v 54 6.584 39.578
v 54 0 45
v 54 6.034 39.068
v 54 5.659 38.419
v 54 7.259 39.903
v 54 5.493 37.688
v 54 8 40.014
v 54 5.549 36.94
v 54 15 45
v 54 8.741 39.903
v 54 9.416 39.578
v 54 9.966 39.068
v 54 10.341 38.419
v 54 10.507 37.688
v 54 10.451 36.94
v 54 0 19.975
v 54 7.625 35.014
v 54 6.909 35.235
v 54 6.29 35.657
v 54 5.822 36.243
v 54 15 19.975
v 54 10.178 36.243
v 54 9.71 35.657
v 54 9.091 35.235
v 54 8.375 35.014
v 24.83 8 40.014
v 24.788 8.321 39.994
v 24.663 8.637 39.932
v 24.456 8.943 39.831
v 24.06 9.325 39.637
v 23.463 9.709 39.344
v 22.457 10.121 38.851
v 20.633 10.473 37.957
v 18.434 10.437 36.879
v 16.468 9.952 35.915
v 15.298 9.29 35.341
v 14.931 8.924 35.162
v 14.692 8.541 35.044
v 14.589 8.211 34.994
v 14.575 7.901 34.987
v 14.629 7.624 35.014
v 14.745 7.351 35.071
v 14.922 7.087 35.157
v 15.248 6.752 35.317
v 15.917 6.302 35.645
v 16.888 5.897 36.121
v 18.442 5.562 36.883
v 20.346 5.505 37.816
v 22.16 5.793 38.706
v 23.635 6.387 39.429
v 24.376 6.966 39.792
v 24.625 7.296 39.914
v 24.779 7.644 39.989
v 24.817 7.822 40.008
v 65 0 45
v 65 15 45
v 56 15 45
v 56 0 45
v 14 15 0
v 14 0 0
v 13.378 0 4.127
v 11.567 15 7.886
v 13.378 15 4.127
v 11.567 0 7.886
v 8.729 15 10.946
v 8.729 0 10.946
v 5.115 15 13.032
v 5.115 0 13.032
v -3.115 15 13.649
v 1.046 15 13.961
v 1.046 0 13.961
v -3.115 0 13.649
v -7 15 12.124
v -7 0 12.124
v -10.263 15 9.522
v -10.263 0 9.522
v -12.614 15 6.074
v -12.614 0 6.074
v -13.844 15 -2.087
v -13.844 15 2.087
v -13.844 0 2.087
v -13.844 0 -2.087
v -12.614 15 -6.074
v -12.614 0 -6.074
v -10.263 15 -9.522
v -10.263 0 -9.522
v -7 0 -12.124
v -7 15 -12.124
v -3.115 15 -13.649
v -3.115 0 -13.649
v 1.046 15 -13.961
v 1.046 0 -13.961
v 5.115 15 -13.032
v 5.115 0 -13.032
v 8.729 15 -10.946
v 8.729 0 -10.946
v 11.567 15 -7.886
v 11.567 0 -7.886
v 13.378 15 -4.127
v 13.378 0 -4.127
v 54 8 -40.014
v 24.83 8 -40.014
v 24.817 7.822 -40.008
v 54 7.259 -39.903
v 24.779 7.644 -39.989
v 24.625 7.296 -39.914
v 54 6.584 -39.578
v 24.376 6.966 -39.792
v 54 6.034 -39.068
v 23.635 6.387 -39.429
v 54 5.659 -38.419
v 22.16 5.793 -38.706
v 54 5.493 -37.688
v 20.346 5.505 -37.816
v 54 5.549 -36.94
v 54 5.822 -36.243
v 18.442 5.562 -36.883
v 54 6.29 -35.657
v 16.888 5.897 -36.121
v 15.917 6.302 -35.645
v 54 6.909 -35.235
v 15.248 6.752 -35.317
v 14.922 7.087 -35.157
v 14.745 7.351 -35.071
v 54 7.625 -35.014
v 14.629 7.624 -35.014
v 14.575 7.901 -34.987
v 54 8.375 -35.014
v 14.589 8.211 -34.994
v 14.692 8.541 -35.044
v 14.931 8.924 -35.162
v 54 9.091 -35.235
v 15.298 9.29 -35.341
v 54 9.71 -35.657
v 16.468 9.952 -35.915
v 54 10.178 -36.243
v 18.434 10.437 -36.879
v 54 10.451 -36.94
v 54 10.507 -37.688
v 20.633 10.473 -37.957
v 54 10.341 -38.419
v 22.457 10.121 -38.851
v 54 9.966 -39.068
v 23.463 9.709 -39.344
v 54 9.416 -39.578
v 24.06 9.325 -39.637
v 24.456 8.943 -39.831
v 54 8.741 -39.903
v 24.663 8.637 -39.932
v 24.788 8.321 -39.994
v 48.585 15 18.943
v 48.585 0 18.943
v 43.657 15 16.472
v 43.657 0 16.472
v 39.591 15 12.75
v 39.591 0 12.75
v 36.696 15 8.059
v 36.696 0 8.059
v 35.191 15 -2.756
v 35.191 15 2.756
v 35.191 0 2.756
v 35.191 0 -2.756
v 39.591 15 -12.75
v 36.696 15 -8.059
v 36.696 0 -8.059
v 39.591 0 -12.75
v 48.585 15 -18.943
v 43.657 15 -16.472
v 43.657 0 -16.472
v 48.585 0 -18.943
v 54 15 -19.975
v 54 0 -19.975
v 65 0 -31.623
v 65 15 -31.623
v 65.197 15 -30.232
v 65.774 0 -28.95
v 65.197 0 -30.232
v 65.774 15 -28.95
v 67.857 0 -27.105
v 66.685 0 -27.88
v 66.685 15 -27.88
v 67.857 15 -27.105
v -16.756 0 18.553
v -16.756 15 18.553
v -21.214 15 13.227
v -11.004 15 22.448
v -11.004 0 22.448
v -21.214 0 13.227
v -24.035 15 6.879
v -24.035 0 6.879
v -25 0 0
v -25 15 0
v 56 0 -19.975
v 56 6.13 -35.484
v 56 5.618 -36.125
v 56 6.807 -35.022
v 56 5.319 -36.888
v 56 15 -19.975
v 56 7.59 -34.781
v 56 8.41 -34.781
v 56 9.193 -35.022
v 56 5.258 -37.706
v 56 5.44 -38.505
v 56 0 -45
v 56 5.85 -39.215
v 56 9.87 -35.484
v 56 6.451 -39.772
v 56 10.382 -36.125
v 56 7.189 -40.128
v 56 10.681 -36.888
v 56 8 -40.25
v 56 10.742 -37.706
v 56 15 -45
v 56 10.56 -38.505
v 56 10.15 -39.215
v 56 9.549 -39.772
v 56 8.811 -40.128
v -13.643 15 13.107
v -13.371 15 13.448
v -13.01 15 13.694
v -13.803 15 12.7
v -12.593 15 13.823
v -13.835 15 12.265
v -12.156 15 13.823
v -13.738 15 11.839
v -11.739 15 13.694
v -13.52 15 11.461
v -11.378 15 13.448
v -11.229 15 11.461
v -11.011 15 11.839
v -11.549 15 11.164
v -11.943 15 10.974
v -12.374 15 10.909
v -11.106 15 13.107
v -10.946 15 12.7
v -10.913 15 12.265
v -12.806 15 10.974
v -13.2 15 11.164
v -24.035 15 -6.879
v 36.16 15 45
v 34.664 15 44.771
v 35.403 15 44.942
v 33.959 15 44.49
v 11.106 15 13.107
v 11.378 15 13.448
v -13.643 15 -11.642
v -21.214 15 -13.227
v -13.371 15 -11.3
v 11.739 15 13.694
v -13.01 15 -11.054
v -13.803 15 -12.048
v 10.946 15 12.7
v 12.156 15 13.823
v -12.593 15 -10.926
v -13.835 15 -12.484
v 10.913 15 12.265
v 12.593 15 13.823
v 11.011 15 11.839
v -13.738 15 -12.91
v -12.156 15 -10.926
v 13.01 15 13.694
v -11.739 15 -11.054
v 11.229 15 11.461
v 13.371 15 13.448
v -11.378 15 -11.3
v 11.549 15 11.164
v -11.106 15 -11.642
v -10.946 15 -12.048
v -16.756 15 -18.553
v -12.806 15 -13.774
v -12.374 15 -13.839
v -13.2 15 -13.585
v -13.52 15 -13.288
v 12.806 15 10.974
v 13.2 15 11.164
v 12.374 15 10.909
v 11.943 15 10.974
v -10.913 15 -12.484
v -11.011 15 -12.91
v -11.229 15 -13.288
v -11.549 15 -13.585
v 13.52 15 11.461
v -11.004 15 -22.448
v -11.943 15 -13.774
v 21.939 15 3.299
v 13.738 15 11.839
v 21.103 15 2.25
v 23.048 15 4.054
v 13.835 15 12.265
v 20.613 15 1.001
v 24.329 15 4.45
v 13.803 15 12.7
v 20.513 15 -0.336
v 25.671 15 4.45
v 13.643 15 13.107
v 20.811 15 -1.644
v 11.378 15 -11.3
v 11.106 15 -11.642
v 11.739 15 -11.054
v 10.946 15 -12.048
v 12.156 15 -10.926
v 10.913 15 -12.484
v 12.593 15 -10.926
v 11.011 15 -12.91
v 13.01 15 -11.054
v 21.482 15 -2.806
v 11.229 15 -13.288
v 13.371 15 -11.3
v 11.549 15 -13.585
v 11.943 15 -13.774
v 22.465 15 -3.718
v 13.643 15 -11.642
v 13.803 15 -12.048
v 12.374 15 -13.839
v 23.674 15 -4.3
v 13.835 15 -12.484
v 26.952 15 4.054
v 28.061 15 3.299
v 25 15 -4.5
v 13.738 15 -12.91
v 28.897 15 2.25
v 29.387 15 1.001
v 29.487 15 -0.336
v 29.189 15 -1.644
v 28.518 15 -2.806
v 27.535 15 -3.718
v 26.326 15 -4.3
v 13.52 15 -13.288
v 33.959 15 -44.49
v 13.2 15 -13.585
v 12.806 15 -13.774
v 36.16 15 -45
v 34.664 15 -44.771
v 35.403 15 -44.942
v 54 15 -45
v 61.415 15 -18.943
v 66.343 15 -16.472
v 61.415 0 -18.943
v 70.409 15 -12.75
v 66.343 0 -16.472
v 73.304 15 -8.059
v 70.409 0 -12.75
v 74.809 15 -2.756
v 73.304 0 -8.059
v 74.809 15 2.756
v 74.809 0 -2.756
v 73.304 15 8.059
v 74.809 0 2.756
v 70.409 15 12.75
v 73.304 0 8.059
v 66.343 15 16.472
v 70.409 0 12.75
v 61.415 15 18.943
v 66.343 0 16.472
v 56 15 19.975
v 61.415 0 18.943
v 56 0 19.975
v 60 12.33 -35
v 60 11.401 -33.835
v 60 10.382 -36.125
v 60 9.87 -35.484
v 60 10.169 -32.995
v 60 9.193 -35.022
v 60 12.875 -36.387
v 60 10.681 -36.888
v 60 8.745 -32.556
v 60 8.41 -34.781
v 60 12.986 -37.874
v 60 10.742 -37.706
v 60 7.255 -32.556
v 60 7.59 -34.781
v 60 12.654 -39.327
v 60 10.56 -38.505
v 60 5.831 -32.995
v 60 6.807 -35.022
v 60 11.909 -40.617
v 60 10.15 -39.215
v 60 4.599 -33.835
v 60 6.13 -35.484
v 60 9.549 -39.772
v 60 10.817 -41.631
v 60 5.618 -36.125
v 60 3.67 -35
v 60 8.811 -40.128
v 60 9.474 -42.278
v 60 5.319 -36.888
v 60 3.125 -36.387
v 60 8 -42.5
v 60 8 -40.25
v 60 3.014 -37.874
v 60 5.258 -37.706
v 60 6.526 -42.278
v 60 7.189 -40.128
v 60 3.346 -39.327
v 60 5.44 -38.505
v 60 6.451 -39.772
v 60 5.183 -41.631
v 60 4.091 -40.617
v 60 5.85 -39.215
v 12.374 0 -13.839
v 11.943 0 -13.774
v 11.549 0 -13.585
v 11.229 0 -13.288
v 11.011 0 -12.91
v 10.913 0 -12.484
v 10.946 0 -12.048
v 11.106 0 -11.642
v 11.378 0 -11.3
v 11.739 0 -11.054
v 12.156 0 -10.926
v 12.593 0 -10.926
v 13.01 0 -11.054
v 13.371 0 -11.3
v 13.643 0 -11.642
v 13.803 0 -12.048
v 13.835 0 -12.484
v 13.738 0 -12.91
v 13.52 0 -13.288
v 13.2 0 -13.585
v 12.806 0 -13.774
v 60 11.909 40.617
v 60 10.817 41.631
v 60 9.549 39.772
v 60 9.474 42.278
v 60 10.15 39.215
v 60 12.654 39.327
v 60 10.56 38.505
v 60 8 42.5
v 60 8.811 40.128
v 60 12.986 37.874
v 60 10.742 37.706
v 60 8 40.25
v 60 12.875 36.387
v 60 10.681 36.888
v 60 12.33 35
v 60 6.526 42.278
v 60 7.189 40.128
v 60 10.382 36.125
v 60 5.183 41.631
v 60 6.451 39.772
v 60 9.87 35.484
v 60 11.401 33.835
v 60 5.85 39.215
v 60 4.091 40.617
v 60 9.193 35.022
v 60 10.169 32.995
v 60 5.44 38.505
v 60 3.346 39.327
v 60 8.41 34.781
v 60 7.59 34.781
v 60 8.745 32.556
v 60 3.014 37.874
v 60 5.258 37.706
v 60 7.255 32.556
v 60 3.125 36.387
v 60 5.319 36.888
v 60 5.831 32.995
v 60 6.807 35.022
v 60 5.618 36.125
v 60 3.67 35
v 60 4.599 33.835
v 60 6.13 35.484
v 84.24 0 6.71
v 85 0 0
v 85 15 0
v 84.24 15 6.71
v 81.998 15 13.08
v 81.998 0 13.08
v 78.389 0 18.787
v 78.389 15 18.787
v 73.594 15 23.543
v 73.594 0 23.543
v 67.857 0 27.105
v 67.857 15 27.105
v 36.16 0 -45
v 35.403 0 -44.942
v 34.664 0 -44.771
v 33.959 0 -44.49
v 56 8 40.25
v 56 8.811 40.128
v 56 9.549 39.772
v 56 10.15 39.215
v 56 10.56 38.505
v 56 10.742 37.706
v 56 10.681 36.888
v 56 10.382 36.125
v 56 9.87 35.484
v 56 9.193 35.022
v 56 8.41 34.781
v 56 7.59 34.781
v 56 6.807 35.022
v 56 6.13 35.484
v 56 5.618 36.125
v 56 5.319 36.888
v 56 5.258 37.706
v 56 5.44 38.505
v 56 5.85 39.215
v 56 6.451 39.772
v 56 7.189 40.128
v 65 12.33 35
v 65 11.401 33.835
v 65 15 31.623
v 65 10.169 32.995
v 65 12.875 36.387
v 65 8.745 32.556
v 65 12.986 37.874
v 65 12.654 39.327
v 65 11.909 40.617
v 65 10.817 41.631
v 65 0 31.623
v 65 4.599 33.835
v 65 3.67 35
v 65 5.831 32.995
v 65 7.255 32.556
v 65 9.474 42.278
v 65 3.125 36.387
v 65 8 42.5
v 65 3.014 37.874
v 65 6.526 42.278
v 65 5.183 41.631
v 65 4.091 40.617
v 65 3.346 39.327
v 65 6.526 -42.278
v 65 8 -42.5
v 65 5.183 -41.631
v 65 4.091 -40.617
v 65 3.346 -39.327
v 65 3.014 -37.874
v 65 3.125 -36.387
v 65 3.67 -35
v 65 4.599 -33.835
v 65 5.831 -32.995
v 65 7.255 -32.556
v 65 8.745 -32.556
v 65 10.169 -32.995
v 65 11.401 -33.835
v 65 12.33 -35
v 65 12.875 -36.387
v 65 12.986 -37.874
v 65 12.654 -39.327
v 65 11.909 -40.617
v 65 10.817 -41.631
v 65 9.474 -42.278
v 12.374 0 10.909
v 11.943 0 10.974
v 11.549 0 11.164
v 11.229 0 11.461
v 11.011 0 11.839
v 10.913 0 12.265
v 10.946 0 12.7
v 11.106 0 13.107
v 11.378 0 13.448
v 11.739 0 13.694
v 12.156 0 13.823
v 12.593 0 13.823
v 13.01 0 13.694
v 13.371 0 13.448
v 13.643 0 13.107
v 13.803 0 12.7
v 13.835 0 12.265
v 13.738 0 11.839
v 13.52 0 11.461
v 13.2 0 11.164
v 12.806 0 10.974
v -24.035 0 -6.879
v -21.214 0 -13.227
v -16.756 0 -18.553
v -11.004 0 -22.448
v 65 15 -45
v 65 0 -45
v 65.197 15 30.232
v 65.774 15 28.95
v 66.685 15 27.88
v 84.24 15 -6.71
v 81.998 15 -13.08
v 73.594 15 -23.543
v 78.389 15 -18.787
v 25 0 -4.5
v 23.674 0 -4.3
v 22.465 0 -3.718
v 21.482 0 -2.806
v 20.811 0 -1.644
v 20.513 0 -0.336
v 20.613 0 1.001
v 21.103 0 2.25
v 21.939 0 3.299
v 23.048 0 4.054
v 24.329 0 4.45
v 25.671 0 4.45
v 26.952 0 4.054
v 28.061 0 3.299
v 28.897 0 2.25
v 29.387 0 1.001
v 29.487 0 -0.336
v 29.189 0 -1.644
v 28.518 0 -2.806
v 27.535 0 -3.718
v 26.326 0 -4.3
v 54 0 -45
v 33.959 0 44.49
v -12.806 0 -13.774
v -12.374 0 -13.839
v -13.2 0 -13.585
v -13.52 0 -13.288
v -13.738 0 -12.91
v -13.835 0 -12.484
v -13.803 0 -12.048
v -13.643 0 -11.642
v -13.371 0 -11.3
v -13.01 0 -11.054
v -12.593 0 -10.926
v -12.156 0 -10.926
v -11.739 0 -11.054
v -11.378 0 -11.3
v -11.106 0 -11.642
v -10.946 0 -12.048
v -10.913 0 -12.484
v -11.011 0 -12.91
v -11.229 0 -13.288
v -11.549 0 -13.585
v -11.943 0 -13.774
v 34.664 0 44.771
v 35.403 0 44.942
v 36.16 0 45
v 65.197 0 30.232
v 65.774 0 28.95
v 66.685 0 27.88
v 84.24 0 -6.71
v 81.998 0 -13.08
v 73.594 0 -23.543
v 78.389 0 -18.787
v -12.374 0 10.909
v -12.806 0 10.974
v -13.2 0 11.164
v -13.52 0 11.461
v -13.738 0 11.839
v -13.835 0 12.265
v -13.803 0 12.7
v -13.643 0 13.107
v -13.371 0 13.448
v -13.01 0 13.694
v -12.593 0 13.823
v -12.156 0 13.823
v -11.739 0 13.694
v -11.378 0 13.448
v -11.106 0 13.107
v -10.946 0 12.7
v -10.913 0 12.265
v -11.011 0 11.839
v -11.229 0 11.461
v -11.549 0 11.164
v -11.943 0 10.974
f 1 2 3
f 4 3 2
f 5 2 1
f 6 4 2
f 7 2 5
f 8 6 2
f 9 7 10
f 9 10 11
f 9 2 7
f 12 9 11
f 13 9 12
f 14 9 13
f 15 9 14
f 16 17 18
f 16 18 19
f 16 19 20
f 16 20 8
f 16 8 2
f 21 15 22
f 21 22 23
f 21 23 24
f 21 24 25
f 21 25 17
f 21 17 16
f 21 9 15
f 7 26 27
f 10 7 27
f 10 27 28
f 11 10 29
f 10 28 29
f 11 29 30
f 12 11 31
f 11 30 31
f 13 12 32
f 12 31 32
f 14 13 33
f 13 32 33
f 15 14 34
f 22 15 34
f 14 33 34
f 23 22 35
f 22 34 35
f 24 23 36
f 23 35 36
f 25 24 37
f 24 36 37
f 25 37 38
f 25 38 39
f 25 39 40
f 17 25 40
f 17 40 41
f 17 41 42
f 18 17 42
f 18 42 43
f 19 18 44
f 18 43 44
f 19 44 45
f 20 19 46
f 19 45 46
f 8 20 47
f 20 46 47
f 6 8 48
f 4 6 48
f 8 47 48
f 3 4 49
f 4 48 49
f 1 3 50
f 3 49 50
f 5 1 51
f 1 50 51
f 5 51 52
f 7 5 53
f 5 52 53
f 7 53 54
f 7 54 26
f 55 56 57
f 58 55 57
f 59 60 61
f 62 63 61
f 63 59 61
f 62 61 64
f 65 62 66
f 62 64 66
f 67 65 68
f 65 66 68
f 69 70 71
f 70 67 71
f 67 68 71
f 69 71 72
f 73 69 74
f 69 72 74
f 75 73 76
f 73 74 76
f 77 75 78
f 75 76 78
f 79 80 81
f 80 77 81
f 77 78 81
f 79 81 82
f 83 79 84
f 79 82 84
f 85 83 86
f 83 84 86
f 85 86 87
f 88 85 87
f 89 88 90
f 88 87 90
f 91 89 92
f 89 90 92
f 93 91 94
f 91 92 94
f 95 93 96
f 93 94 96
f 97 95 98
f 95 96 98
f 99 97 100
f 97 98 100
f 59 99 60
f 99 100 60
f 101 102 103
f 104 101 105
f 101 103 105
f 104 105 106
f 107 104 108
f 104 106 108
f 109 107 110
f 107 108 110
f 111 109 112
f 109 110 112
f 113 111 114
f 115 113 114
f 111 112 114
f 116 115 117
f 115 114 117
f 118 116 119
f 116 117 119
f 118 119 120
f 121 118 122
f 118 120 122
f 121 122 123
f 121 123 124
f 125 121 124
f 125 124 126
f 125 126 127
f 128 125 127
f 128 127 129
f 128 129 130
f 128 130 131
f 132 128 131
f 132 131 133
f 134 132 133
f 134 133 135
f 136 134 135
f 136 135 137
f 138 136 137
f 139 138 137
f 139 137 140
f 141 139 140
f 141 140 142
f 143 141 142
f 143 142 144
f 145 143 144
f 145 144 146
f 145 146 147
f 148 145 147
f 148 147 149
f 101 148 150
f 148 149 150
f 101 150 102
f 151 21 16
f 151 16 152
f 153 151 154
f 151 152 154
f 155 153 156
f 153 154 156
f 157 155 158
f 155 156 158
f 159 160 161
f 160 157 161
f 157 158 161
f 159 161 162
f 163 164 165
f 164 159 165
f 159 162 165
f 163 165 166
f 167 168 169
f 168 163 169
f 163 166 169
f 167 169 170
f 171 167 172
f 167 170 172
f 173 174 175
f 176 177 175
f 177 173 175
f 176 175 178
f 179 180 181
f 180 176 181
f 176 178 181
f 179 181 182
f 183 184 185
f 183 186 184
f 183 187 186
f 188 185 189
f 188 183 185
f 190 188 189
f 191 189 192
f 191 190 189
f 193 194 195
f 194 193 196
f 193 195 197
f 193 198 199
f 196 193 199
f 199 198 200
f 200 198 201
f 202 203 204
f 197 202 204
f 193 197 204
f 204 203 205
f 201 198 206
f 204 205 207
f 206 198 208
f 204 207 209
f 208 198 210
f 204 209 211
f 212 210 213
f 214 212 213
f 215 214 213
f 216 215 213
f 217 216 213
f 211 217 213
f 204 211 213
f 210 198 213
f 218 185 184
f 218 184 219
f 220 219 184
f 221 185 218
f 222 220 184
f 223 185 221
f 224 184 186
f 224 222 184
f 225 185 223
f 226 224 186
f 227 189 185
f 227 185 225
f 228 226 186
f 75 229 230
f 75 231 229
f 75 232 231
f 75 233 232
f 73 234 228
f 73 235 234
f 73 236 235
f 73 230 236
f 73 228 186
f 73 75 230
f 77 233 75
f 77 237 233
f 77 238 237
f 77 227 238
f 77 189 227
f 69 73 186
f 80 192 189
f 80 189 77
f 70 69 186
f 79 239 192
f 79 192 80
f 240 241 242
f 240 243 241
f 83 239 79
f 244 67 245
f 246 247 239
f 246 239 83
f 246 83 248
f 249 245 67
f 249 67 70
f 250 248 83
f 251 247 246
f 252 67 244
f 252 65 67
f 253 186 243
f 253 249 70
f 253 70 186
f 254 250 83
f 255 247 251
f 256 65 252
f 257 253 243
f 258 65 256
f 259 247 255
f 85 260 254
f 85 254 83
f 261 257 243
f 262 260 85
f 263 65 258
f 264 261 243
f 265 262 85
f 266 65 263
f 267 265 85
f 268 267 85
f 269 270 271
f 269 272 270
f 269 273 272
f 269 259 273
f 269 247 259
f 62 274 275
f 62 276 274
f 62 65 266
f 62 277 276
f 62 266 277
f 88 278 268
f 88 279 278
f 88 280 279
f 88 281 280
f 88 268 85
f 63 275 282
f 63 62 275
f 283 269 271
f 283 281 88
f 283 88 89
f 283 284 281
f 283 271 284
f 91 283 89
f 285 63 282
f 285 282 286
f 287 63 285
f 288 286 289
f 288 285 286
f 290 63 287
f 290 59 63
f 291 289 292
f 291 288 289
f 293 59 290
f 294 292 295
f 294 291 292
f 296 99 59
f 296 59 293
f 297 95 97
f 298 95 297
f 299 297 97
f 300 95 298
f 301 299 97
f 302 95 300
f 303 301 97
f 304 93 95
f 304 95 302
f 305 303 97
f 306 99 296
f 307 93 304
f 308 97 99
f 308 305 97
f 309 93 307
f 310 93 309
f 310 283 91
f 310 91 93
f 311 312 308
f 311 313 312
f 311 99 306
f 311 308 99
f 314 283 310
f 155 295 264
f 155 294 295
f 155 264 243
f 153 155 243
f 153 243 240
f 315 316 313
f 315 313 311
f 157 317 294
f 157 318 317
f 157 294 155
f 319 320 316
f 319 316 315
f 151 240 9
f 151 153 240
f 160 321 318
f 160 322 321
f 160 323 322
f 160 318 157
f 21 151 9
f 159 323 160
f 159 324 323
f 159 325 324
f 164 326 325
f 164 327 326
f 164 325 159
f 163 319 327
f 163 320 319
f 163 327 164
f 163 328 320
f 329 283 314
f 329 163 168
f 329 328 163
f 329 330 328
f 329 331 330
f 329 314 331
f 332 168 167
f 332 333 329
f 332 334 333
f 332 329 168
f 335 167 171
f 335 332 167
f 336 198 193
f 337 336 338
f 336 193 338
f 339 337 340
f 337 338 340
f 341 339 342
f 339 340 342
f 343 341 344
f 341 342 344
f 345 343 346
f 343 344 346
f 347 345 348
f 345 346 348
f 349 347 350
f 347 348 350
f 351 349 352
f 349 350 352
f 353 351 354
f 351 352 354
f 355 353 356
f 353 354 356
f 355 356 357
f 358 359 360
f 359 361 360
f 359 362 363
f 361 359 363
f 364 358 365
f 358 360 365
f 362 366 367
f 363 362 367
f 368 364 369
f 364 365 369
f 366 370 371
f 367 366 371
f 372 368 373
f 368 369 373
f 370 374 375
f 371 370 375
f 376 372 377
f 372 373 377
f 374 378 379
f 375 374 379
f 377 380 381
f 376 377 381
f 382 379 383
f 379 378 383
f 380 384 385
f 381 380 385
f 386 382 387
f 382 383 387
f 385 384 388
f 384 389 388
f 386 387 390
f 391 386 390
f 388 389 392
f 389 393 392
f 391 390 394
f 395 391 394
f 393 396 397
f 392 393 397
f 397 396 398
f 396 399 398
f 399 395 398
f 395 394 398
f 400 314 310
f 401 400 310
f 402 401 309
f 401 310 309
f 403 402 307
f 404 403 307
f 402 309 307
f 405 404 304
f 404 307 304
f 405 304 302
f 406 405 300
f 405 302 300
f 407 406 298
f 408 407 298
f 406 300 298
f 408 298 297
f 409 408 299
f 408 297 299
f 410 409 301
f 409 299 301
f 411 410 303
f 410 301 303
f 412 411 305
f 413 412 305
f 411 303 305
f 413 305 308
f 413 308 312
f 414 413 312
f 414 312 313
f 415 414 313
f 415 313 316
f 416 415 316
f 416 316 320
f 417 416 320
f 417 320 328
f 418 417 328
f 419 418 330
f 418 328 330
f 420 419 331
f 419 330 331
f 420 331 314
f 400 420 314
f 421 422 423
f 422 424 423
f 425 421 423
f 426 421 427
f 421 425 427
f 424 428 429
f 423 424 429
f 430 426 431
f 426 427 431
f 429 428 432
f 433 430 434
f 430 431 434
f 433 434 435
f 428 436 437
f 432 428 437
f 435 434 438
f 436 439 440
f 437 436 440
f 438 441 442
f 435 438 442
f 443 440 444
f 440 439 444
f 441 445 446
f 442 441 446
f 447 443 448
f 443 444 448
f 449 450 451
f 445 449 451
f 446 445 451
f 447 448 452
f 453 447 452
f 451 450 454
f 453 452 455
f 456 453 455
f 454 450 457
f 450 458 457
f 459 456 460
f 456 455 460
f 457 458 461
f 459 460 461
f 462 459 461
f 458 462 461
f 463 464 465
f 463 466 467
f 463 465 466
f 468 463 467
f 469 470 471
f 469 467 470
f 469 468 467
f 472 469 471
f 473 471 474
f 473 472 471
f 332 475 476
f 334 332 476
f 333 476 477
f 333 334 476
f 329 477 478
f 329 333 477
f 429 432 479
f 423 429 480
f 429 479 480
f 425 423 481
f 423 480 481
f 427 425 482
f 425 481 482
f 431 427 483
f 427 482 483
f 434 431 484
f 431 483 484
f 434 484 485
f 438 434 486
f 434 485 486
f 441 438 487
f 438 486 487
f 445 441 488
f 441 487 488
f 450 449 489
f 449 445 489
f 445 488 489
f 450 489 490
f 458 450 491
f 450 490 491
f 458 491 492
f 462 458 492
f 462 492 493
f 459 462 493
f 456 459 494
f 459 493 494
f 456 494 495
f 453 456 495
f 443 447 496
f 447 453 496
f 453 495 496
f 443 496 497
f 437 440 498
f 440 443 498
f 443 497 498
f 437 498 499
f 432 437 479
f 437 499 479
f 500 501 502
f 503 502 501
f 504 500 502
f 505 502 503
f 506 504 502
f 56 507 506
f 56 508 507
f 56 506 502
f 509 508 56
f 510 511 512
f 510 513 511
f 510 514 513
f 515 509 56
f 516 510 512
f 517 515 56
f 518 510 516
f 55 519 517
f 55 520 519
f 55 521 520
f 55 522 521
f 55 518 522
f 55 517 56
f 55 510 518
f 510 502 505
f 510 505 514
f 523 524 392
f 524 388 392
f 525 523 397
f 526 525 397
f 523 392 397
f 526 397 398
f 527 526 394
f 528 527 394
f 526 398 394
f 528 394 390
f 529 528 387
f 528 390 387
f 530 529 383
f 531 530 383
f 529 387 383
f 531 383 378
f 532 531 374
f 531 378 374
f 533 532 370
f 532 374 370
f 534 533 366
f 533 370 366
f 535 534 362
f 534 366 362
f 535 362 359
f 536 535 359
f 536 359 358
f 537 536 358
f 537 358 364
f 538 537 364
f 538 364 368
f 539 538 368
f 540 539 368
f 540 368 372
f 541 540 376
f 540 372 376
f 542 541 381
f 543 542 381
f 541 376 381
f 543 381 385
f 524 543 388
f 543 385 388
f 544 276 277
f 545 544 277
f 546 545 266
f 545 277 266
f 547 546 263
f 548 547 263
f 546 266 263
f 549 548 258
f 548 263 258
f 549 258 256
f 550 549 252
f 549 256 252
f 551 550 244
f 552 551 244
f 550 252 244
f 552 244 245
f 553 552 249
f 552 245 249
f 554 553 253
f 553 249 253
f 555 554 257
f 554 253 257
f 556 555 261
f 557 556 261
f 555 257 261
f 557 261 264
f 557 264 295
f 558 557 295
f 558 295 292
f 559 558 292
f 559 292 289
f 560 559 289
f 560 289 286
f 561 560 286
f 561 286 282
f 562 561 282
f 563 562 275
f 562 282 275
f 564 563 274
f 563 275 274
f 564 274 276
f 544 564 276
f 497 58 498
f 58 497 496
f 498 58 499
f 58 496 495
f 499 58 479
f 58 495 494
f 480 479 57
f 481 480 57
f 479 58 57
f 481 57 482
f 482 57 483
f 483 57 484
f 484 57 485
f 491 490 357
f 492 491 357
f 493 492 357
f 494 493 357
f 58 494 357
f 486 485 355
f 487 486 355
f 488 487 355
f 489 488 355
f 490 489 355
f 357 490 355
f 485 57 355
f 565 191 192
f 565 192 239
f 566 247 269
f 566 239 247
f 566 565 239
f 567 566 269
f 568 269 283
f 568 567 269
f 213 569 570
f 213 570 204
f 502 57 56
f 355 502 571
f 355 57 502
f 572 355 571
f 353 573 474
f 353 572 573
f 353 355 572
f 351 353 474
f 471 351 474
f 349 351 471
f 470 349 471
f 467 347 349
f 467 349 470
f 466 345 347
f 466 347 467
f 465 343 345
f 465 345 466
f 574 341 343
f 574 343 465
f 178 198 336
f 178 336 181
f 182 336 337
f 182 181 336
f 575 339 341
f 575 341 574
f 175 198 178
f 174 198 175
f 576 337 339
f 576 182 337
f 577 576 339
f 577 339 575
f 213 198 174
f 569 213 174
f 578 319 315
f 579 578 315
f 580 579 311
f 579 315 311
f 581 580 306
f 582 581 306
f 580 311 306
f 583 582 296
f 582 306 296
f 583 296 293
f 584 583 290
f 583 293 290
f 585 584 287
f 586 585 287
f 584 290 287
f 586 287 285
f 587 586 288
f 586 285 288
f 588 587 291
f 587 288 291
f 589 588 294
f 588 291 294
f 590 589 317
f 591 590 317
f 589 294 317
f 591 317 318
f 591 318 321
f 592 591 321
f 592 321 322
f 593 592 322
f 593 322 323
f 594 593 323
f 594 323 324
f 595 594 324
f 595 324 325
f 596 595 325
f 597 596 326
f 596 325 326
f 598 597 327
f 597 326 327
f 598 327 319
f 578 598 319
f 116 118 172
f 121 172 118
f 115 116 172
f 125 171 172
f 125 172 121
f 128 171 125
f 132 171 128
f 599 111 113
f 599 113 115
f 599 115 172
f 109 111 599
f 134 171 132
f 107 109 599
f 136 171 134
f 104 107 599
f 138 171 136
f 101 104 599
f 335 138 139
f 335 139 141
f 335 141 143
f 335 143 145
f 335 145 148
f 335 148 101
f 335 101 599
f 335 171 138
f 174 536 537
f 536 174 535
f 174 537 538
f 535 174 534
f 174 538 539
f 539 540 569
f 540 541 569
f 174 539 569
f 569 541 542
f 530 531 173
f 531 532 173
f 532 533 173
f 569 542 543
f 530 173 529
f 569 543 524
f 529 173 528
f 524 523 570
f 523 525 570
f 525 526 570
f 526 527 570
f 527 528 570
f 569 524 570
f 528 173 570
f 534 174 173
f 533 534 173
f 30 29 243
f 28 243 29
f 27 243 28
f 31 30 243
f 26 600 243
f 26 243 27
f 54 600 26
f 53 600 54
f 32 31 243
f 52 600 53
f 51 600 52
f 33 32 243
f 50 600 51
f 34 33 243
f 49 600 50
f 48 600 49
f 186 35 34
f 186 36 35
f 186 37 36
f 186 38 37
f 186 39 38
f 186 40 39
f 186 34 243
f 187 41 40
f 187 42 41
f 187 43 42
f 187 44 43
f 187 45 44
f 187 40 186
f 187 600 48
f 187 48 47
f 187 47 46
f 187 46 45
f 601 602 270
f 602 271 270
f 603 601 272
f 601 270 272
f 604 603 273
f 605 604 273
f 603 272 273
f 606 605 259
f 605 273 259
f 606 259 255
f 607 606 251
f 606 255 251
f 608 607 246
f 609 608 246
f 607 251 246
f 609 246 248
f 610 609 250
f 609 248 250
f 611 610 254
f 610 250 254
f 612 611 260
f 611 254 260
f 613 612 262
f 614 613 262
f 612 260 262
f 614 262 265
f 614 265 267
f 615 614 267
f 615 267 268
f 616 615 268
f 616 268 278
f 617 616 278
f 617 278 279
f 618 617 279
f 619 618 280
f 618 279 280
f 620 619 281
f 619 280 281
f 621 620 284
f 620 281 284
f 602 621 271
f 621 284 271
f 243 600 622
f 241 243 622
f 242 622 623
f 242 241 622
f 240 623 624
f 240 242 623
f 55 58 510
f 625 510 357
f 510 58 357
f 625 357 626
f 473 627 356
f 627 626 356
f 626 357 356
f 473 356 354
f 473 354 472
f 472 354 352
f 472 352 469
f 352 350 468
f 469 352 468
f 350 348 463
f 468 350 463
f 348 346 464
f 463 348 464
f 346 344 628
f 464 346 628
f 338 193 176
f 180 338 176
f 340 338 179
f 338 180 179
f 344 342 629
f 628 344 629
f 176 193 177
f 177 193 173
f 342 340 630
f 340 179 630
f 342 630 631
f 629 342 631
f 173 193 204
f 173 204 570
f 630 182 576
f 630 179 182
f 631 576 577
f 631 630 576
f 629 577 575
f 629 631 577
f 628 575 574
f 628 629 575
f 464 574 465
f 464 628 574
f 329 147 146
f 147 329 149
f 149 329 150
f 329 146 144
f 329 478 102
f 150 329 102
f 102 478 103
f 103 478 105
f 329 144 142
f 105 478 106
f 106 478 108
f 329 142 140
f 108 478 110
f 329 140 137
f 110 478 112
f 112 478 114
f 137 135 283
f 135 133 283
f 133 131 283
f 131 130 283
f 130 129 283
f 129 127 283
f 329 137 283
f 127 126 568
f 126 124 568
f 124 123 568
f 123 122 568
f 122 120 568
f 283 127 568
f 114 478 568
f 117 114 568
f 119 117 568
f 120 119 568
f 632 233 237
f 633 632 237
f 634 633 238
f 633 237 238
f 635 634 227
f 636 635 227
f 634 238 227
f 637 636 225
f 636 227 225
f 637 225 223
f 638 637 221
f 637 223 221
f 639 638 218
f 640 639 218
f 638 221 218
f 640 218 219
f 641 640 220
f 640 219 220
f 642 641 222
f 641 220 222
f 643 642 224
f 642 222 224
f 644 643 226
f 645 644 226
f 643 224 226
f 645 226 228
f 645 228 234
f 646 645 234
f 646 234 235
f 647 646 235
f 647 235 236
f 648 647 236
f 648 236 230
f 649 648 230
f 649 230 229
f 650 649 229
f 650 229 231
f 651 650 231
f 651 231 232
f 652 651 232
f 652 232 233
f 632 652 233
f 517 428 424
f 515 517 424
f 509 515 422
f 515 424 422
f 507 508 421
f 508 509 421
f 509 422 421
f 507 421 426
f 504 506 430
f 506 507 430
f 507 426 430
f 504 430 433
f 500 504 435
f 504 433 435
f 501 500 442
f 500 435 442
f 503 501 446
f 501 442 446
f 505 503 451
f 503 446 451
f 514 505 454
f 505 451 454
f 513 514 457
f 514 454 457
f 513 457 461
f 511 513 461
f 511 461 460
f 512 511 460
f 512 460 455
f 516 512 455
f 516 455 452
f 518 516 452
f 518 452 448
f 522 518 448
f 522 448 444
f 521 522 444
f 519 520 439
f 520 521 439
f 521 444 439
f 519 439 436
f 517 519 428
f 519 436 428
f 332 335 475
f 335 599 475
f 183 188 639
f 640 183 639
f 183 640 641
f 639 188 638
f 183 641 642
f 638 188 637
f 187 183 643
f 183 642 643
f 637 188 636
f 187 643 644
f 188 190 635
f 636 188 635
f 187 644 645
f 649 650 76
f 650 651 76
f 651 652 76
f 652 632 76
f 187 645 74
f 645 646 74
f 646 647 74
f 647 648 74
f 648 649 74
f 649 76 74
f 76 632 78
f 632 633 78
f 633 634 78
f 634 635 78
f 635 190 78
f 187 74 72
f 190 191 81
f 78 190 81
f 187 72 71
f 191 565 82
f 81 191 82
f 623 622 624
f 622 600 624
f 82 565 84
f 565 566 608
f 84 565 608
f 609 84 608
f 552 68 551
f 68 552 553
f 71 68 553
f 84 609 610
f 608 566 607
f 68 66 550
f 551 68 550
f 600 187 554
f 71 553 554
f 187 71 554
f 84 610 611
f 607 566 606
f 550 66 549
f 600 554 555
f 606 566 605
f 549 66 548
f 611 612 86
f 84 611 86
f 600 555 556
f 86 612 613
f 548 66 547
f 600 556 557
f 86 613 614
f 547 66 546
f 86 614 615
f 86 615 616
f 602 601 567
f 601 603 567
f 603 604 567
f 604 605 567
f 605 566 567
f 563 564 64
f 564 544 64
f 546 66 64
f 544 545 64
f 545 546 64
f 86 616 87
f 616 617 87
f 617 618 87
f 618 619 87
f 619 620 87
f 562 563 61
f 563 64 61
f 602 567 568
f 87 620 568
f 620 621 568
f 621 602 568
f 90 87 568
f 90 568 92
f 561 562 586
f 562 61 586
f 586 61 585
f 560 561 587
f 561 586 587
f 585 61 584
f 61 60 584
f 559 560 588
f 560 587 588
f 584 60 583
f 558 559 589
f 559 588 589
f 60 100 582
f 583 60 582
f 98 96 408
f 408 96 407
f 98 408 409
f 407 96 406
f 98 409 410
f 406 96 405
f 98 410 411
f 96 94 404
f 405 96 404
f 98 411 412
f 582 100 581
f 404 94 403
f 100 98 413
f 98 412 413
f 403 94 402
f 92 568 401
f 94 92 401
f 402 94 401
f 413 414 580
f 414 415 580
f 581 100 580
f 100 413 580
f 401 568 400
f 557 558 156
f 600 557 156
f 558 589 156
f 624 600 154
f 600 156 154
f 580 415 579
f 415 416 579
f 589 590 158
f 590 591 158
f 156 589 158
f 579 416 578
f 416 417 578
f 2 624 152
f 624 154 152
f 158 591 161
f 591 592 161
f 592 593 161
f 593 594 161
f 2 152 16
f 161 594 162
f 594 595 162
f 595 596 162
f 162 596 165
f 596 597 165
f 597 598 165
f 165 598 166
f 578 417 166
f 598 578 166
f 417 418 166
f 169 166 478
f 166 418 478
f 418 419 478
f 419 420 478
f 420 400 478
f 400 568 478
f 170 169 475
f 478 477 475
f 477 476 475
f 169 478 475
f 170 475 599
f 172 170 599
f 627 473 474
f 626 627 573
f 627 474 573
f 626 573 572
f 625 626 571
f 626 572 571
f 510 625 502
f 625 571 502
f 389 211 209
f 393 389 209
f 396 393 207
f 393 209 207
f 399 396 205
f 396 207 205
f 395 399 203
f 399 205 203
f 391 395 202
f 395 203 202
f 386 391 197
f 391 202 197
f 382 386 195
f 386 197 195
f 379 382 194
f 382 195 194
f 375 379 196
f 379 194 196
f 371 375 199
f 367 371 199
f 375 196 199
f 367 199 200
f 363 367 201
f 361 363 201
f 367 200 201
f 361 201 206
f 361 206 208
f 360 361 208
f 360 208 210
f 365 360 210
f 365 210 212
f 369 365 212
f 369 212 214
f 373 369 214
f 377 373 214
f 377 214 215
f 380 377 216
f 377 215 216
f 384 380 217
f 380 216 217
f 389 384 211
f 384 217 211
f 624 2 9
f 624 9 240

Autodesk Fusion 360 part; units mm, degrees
sketch "Sketch1" plane through (0, 0, 0) normal (0, 1, 0) x (1, 0, 0)
  circle A0 centre (0, 0) radius 17.5 construction
  line L0 (-12.3744, 12.3744) -> (12.3744, 12.3744) construction
  line L1 (12.3744, 12.3744) -> (12.3744, -12.3744) construction
  line L2 (12.3744, -12.3744) -> (-12.3744, -12.3744) construction
  line L3 (-12.3744, -12.3744) -> (-12.3744, 12.3744) construction
  circle A1 centre (0, 0) radius 14
  circle A2 centre (55, 0) radius 20
  line L4 (65, 28.2843) -> (65, 45)
  line L5 (65, 45) -> (35, 45)
  line L6 (35, 45) -> (-11.0043, 22.4478)
  arc A3 (-11.0043, 22.4478) -> (-25, 0) centre (0, 0) ccw
  arc A4 (85, 0) -> (65, 28.2843) centre (55, 0) ccw
  line L7 (1.75, 0) -> (22.5, 0)
  arc A5 (65, -28.2843) -> (85, 0) centre (55, 0) ccw
  line L8 (65, -28.2843) -> (65, -45)
  line L9 (65, -45) -> (35, -45)
  line L10 (35, -45) -> (-11.0043, -22.4478)
  arc A6 (-25, 0) -> (-11.0043, -22.4478) centre (0, 0) ccw
  point P0 (25, 0)
  dimension "d1" = 35
  dimension "d2" = 28
  dimension "d3" = 40
  dimension "d4" = 55
  dimension "d5" = 25
  dimension "d6" = 30
  dimension "d7" = 10
  dimension "d8" = 30
  dimension "d9" = 45
  dimension "d31" = 30
extrude "Extrude1" add sketch "Sketch1" along normal blind 15 makes body 1
hole "Hole1" at (-12.3744, 0, 12.3744) at (12.3744, 0, 12.3744) at (12.3744, 0, -12.3744) at (-12.3744, 0, -12.3744) direction (0, 1, 0) diameter 2.93 end through all bodies 1 1
ref_plane "WorkPlane1" through (55, 0, 0) normal (1, 0, 0) x (0, 1, 0)
sketch "Sketch2" plane through (55, 0, 0) normal (1, 0, 0) x (0, 0, -1)
  line L0 (-52.531, 37.047) -> (45, 37.047)
  line L1 (45, 37.047) -> (45, -15)
  line L2 (45, -15) -> (-52.531, -15)
  line L3 (-52.531, -15) -> (-52.531, 37.047)
extrude "Extrude2" cut sketch "Sketch2" along normal mid plane 2 bodies 1 makes body 2 at (73.8112, 10, -23.3696)
sketch "Sketch3" plane through (65, 0, 0) normal (1, 0, 0) x (0, 0, -1)
  line L0 (28.2843, 0) -> (45, 0)
  line L1 (45, 0) -> (45, 15)
  line L2 (45, 15) -> (28.2843, 15)
  line L3 (28.2843, 15) -> (28.2843, 0)
  point P0 (37.5, 8)
  dimension "d23" = 7.5
hole "Hole2" at (65, 8, -37.5) direction (-1, 0, 0) diameter 5.5 depth 10 tip angle 180 counterbore diameter 10 counterbore depth 5 bodies 2
hole "Hole3" at (65, 8, -37.5) direction (-1, 0, 0) diameter 5.029 end through all bodies 1 1
mirror "Mirror1" about plane through (0, 0, 0) normal (0, 0, 1) of "Hole3", "Hole2"
fillet "Fillet1" radius 5 4 edges at (35, 7.5, -45) (35, 7.5, 45) (65, 7.5, -28.2843) (65, 7.5, 28.2843) on bodies 1 2
hole "Hole4" at (25, 0, 0) direction (0, 1, 0) diameter 9 end through all bodies 1 1
copy_body "Body->Comp1" bodies 1 removing the originals makes body 3 in component "console"
copy_body "Body->Comp2" bodies 2 removing the originals makes body 4 in component "brace"
component "console" placed x (1, 0, 0) y (0, 1, 0) z (0, 0, 1) at (0, 0, 0)
component "brace" placed x (1, 0, 0) y (0, 1, 0) z (0, 0, 1) at (0, 0, 0)
